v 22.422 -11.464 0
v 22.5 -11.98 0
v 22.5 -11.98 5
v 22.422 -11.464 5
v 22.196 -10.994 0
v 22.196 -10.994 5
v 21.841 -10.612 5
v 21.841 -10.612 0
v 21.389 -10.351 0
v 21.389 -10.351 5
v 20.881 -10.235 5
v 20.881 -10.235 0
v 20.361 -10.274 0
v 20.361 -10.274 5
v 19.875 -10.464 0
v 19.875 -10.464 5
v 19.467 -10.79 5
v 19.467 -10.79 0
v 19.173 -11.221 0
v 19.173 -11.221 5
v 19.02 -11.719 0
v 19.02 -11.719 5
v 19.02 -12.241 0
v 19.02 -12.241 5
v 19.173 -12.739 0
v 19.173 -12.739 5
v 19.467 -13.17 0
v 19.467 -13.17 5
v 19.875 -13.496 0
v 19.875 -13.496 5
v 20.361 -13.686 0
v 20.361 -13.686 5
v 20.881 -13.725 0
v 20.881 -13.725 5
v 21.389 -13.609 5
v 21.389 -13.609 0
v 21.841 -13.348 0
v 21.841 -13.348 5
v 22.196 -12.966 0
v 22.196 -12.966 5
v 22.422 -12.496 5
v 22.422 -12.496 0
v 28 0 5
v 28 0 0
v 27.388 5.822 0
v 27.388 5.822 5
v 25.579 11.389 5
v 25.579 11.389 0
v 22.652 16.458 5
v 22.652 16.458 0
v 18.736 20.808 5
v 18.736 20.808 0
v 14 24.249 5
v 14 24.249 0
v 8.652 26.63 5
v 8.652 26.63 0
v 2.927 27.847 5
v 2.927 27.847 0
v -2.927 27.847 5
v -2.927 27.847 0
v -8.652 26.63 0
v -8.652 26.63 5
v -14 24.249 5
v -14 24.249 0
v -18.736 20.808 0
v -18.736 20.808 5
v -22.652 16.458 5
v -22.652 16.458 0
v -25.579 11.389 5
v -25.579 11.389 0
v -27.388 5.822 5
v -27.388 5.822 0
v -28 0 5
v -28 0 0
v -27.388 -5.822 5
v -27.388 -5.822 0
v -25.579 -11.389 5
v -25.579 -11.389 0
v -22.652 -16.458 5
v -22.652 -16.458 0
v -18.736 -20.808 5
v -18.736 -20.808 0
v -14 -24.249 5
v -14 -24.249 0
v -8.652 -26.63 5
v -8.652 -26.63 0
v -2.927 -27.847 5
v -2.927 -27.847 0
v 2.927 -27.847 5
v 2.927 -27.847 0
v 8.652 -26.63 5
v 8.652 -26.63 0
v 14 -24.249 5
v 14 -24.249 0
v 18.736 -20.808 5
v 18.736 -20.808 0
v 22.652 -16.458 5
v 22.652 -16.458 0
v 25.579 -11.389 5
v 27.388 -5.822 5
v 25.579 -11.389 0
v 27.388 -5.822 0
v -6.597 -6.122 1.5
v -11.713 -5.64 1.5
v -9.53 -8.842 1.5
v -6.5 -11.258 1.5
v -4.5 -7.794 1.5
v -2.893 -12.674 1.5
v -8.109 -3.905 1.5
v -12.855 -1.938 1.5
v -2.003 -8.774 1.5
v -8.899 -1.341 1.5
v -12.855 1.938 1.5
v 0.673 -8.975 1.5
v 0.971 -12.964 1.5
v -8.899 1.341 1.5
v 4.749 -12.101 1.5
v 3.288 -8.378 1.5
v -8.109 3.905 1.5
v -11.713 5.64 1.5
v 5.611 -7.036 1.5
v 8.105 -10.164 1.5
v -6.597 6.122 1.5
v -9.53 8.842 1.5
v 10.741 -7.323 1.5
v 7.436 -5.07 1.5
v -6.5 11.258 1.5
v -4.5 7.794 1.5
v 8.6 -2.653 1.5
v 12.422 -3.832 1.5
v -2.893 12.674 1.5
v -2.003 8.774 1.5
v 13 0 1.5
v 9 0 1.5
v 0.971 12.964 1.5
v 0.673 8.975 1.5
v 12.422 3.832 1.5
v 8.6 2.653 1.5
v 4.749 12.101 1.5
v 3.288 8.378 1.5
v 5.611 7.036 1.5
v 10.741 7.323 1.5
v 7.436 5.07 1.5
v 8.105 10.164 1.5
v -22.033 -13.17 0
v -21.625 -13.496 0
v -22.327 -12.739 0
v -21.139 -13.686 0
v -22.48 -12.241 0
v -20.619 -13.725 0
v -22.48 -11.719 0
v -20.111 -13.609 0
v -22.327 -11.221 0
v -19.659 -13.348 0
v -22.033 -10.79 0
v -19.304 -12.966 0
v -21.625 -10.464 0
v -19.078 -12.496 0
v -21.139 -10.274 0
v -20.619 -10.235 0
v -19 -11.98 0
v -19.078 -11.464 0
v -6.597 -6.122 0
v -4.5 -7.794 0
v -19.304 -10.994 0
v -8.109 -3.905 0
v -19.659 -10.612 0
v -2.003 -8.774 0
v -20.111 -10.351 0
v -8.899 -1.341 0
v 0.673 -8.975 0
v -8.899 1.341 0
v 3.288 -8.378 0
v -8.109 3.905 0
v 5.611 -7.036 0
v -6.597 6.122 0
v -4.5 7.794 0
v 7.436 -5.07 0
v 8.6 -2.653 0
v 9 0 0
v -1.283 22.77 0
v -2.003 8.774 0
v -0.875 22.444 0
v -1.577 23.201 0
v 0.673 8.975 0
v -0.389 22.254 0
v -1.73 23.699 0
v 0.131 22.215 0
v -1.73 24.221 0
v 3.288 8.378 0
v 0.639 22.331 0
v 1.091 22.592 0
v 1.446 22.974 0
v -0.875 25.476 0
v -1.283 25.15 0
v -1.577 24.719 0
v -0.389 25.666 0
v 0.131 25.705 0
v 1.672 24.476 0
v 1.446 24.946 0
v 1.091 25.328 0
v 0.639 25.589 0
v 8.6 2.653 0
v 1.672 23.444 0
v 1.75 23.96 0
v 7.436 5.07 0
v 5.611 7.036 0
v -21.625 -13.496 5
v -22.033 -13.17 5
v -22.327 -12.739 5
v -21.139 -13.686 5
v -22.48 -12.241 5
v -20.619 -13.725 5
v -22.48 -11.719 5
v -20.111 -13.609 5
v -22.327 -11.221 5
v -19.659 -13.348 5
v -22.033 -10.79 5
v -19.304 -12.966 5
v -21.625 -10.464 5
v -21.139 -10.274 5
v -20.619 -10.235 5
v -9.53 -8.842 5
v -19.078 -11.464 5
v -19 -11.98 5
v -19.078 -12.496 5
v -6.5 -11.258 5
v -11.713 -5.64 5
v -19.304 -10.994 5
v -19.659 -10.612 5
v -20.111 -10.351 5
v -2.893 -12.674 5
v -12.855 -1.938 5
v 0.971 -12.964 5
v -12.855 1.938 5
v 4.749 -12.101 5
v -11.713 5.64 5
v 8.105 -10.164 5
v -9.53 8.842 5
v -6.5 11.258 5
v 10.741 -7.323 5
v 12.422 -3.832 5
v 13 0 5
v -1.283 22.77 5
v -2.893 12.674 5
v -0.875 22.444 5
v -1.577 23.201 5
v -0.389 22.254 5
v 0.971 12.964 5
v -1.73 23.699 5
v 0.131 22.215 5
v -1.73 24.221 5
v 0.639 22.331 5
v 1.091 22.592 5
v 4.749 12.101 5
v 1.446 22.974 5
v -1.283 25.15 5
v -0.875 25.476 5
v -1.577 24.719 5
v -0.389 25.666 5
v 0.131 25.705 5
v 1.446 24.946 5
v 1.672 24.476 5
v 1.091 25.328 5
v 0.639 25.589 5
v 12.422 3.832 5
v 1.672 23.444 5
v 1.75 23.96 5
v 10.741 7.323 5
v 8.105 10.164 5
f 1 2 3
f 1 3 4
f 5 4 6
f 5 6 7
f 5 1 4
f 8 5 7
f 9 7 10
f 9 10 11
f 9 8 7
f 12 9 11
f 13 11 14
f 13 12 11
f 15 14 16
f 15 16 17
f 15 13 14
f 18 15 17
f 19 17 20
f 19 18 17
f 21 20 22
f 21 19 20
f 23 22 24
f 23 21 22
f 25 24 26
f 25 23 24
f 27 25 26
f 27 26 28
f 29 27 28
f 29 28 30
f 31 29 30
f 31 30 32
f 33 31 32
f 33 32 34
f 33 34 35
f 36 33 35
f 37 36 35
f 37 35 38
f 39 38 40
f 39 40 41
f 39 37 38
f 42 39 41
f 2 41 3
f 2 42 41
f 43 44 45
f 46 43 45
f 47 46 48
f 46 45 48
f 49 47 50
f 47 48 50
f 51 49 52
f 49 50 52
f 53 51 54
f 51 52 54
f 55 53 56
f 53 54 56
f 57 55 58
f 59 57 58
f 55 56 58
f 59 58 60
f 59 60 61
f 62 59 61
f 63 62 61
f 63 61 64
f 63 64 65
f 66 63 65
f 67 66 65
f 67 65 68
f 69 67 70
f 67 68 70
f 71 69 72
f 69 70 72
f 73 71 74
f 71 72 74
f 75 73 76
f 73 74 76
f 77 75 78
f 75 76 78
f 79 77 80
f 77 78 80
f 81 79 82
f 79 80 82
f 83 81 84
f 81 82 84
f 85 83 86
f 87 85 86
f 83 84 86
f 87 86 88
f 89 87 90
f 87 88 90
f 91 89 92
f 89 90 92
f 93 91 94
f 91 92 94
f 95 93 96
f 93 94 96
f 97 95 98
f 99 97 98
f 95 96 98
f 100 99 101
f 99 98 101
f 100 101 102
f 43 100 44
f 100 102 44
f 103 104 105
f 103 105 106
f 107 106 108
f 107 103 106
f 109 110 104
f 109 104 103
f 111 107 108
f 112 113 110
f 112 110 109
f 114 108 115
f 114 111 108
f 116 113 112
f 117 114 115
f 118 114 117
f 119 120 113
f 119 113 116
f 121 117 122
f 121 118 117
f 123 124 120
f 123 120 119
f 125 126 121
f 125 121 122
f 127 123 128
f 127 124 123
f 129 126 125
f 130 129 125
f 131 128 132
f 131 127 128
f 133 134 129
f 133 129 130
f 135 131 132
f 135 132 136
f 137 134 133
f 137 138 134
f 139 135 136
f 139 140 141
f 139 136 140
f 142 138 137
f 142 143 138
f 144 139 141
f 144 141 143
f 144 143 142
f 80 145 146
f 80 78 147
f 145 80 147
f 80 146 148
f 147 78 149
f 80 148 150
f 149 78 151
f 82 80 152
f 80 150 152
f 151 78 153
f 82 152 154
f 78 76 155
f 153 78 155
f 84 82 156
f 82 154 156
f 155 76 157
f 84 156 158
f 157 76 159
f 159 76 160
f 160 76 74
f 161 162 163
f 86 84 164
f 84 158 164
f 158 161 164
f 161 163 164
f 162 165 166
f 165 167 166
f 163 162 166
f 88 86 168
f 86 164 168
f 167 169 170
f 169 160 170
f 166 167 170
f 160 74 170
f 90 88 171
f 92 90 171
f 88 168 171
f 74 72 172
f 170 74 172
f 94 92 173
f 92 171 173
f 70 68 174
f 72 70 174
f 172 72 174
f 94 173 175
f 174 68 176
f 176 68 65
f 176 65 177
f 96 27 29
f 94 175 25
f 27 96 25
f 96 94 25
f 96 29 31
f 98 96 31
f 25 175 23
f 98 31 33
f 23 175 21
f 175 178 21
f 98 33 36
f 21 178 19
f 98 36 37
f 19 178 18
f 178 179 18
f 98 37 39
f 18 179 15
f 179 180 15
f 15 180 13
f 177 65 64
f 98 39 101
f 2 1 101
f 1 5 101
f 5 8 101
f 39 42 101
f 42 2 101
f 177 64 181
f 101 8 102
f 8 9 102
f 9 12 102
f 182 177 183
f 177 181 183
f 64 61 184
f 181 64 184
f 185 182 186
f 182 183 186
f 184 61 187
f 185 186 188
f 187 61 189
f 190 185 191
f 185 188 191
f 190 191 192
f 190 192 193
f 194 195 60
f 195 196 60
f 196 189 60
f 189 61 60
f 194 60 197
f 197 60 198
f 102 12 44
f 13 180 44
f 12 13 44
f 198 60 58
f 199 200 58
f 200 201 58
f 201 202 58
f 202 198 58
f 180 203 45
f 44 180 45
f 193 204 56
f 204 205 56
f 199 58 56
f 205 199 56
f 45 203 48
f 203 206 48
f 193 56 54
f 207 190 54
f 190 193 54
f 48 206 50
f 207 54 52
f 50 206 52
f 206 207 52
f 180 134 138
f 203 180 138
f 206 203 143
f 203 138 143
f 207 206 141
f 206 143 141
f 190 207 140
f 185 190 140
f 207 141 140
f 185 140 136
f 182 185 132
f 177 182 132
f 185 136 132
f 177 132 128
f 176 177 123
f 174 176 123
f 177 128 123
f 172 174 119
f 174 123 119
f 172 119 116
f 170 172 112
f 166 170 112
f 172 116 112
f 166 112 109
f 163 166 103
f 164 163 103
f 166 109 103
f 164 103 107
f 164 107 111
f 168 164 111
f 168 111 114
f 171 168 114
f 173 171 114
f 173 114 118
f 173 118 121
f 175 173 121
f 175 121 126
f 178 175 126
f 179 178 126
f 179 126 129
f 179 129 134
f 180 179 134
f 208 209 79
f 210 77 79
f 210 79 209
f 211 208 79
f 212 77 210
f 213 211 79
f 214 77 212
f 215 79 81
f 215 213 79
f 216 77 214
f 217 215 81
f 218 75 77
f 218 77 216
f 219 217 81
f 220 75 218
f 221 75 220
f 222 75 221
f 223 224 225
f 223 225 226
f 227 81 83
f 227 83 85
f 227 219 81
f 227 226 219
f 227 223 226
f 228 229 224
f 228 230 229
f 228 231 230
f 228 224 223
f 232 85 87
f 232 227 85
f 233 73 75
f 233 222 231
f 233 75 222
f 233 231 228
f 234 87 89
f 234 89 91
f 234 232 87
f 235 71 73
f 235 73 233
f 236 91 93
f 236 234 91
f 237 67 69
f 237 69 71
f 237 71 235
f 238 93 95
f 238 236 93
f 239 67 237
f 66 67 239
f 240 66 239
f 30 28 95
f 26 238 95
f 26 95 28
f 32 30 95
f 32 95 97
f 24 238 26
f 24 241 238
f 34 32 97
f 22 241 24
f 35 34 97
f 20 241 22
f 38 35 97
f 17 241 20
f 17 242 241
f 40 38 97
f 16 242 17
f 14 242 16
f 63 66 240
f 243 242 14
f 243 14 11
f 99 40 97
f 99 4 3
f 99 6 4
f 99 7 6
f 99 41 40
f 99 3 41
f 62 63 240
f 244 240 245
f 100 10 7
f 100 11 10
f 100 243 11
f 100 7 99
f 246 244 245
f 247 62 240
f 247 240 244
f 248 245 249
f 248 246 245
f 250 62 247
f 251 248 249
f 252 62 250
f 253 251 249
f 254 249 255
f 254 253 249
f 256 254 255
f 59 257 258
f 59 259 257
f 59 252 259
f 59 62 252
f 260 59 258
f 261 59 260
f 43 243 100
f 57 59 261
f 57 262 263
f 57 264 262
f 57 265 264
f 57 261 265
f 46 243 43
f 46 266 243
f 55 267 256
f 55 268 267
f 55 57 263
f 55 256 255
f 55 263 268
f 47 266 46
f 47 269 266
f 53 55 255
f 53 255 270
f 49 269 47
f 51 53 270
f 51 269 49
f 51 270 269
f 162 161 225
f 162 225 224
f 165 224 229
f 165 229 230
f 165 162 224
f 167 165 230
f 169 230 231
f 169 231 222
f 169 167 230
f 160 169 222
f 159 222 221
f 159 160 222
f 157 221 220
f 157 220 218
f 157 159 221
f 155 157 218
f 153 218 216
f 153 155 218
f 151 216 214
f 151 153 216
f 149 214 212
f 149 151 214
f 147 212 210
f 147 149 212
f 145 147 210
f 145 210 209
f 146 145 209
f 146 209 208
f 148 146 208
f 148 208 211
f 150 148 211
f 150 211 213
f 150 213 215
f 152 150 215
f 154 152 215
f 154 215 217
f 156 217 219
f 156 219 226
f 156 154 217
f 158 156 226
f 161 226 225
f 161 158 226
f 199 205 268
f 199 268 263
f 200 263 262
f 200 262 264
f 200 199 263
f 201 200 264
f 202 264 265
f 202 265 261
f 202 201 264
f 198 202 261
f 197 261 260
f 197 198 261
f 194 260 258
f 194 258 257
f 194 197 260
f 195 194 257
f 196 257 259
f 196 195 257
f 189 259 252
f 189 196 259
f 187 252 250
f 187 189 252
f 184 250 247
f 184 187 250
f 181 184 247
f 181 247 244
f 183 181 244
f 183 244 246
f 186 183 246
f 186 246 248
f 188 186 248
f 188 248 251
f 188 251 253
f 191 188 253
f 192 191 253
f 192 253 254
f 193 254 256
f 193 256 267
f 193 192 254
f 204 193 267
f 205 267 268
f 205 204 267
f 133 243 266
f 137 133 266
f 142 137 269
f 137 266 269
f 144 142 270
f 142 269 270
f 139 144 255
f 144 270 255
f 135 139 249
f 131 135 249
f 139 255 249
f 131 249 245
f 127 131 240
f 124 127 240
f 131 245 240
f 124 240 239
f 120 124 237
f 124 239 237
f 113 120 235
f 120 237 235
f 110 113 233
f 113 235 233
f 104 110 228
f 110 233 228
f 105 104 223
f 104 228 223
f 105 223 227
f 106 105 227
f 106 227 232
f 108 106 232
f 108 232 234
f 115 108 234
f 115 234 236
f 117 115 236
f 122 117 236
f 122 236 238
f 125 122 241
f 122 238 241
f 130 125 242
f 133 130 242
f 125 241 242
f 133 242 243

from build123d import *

# Parameters (mm, degrees)
F0_R     = 28
F0_R_2   = 1.75
F1_DEPTH = 5
F2_R     = 13
F3_DEPTH = 3.5
F4_R     = 9
F5_DEPTH = 1.501


# Not quite as in the source:
# - a feature names something its author has since deleted; it is built from what else it names


with BuildPart() as f1:
    # F0 (on Top) → F1 (new body)
    with BuildSketch(Plane.XY):
        Circle(F0_R)
        with Locations((-20.75, -11.9800180857)):
            Circle(F0_R_2, mode=Mode.SUBTRACT)
        with Locations((20.75, -11.9800180857)):
            Circle(F0_R_2, mode=Mode.SUBTRACT)
        with Locations((0, 23.9600361714)):
            Circle(F0_R_2, mode=Mode.SUBTRACT)
    extrude(amount=F1_DEPTH)

    # F2 (on face) → F3 (cut)
    with BuildSketch(Plane.XY.offset(5)):
        Circle(F2_R)
    extrude(amount=-F3_DEPTH, mode=Mode.SUBTRACT)

    # F4 (on face) → F5 (cut, through all)
    with BuildSketch(Plane.XY.offset(1.5)):
        Circle(F4_R)
    extrude(amount=-F5_DEPTH, mode=Mode.SUBTRACT)


solid = f1.part
